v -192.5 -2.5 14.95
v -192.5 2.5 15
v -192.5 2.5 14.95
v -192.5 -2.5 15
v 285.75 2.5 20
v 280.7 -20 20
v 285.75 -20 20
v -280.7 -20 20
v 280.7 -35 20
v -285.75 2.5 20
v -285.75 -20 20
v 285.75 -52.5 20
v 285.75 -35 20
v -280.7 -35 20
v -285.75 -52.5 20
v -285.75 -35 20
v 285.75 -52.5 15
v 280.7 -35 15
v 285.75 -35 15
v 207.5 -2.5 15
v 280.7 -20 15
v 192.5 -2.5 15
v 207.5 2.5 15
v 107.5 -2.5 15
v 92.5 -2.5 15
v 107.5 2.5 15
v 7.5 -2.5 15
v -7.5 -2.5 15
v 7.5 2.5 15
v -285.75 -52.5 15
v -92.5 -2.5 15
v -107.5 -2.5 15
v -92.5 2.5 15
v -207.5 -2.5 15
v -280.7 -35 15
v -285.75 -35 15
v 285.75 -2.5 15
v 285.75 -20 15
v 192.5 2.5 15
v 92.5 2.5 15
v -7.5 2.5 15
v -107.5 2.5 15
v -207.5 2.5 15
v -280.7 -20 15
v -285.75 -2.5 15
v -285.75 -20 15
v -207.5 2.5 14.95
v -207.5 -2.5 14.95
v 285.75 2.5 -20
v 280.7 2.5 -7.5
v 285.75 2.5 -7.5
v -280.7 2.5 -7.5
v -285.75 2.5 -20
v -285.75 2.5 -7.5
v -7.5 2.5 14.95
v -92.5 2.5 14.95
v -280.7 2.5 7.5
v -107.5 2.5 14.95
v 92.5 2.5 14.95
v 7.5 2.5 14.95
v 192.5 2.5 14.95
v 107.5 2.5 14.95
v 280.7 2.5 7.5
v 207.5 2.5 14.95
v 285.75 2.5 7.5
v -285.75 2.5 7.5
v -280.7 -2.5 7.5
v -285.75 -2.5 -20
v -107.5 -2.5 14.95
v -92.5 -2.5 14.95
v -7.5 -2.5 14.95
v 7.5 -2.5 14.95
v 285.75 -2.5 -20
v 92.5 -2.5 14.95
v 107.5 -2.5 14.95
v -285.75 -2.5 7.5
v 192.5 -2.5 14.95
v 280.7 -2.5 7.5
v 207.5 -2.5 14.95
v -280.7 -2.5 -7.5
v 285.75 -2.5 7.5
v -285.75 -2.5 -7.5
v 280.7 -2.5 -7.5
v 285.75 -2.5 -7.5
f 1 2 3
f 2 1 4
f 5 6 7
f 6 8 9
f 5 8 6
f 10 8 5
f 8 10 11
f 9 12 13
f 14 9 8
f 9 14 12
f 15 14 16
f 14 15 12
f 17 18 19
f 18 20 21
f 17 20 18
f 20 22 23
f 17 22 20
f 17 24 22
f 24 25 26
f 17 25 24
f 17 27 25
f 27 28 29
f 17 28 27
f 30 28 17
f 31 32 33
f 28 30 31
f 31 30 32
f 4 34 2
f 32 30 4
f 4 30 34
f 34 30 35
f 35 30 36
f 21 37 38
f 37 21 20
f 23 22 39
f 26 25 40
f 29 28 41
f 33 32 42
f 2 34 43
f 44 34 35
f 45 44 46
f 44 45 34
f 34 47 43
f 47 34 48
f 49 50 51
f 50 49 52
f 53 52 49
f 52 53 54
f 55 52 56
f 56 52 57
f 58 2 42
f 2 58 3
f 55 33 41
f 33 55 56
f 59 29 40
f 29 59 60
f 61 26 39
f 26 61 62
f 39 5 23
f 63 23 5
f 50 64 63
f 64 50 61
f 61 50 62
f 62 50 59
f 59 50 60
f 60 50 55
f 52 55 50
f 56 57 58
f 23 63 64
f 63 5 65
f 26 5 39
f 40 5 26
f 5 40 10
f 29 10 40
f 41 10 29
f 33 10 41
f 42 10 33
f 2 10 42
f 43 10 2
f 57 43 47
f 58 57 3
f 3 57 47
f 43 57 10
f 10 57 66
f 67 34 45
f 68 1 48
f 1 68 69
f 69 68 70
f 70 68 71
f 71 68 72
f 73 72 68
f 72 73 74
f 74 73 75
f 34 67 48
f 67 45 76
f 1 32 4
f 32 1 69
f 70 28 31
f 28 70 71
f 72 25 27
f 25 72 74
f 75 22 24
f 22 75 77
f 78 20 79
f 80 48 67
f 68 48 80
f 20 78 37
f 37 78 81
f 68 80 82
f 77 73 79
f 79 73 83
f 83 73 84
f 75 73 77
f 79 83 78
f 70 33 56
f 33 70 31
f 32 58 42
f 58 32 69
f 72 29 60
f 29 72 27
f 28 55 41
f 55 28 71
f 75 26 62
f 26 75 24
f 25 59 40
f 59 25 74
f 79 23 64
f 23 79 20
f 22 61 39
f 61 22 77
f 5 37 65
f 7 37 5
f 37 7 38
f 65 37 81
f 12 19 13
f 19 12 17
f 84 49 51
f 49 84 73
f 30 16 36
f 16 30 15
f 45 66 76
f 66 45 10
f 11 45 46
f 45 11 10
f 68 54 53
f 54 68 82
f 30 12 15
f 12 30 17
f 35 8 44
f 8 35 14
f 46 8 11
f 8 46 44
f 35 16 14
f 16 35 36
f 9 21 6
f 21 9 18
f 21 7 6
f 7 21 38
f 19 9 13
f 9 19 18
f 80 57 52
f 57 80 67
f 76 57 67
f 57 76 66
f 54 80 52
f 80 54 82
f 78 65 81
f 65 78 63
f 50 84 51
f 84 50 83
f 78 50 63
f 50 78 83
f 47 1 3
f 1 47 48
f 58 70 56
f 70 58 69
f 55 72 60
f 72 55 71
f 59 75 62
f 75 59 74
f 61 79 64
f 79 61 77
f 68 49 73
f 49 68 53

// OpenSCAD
top();
front();

module front(){
  difference(){
    cube([571.5,5,40], center=true);
    for(X=[-1,1]) translate([((571.5/2)-2.5)*X,0,0]) cube([5.1,6,15], center=true);
    for(X=[-200,-100,0,100,200]) translate([X,0,17.5]) cube([15,6,5.1], center=true);
  }
}

module top(){
  difference(){
    union(){
      translate([0,-27.5,17.5]) cube([571.5,50,5], center=true);
      for(X=[-200,-100,0,100,200]) translate([X,0,17.5]) cube([15,5,5], center=true);
    }
    for(X=[-1,1]) translate([((571.5/2)-2.5)*X,-27.5,17.5]) cube([5.1,15,6], center=true);
  }
}
